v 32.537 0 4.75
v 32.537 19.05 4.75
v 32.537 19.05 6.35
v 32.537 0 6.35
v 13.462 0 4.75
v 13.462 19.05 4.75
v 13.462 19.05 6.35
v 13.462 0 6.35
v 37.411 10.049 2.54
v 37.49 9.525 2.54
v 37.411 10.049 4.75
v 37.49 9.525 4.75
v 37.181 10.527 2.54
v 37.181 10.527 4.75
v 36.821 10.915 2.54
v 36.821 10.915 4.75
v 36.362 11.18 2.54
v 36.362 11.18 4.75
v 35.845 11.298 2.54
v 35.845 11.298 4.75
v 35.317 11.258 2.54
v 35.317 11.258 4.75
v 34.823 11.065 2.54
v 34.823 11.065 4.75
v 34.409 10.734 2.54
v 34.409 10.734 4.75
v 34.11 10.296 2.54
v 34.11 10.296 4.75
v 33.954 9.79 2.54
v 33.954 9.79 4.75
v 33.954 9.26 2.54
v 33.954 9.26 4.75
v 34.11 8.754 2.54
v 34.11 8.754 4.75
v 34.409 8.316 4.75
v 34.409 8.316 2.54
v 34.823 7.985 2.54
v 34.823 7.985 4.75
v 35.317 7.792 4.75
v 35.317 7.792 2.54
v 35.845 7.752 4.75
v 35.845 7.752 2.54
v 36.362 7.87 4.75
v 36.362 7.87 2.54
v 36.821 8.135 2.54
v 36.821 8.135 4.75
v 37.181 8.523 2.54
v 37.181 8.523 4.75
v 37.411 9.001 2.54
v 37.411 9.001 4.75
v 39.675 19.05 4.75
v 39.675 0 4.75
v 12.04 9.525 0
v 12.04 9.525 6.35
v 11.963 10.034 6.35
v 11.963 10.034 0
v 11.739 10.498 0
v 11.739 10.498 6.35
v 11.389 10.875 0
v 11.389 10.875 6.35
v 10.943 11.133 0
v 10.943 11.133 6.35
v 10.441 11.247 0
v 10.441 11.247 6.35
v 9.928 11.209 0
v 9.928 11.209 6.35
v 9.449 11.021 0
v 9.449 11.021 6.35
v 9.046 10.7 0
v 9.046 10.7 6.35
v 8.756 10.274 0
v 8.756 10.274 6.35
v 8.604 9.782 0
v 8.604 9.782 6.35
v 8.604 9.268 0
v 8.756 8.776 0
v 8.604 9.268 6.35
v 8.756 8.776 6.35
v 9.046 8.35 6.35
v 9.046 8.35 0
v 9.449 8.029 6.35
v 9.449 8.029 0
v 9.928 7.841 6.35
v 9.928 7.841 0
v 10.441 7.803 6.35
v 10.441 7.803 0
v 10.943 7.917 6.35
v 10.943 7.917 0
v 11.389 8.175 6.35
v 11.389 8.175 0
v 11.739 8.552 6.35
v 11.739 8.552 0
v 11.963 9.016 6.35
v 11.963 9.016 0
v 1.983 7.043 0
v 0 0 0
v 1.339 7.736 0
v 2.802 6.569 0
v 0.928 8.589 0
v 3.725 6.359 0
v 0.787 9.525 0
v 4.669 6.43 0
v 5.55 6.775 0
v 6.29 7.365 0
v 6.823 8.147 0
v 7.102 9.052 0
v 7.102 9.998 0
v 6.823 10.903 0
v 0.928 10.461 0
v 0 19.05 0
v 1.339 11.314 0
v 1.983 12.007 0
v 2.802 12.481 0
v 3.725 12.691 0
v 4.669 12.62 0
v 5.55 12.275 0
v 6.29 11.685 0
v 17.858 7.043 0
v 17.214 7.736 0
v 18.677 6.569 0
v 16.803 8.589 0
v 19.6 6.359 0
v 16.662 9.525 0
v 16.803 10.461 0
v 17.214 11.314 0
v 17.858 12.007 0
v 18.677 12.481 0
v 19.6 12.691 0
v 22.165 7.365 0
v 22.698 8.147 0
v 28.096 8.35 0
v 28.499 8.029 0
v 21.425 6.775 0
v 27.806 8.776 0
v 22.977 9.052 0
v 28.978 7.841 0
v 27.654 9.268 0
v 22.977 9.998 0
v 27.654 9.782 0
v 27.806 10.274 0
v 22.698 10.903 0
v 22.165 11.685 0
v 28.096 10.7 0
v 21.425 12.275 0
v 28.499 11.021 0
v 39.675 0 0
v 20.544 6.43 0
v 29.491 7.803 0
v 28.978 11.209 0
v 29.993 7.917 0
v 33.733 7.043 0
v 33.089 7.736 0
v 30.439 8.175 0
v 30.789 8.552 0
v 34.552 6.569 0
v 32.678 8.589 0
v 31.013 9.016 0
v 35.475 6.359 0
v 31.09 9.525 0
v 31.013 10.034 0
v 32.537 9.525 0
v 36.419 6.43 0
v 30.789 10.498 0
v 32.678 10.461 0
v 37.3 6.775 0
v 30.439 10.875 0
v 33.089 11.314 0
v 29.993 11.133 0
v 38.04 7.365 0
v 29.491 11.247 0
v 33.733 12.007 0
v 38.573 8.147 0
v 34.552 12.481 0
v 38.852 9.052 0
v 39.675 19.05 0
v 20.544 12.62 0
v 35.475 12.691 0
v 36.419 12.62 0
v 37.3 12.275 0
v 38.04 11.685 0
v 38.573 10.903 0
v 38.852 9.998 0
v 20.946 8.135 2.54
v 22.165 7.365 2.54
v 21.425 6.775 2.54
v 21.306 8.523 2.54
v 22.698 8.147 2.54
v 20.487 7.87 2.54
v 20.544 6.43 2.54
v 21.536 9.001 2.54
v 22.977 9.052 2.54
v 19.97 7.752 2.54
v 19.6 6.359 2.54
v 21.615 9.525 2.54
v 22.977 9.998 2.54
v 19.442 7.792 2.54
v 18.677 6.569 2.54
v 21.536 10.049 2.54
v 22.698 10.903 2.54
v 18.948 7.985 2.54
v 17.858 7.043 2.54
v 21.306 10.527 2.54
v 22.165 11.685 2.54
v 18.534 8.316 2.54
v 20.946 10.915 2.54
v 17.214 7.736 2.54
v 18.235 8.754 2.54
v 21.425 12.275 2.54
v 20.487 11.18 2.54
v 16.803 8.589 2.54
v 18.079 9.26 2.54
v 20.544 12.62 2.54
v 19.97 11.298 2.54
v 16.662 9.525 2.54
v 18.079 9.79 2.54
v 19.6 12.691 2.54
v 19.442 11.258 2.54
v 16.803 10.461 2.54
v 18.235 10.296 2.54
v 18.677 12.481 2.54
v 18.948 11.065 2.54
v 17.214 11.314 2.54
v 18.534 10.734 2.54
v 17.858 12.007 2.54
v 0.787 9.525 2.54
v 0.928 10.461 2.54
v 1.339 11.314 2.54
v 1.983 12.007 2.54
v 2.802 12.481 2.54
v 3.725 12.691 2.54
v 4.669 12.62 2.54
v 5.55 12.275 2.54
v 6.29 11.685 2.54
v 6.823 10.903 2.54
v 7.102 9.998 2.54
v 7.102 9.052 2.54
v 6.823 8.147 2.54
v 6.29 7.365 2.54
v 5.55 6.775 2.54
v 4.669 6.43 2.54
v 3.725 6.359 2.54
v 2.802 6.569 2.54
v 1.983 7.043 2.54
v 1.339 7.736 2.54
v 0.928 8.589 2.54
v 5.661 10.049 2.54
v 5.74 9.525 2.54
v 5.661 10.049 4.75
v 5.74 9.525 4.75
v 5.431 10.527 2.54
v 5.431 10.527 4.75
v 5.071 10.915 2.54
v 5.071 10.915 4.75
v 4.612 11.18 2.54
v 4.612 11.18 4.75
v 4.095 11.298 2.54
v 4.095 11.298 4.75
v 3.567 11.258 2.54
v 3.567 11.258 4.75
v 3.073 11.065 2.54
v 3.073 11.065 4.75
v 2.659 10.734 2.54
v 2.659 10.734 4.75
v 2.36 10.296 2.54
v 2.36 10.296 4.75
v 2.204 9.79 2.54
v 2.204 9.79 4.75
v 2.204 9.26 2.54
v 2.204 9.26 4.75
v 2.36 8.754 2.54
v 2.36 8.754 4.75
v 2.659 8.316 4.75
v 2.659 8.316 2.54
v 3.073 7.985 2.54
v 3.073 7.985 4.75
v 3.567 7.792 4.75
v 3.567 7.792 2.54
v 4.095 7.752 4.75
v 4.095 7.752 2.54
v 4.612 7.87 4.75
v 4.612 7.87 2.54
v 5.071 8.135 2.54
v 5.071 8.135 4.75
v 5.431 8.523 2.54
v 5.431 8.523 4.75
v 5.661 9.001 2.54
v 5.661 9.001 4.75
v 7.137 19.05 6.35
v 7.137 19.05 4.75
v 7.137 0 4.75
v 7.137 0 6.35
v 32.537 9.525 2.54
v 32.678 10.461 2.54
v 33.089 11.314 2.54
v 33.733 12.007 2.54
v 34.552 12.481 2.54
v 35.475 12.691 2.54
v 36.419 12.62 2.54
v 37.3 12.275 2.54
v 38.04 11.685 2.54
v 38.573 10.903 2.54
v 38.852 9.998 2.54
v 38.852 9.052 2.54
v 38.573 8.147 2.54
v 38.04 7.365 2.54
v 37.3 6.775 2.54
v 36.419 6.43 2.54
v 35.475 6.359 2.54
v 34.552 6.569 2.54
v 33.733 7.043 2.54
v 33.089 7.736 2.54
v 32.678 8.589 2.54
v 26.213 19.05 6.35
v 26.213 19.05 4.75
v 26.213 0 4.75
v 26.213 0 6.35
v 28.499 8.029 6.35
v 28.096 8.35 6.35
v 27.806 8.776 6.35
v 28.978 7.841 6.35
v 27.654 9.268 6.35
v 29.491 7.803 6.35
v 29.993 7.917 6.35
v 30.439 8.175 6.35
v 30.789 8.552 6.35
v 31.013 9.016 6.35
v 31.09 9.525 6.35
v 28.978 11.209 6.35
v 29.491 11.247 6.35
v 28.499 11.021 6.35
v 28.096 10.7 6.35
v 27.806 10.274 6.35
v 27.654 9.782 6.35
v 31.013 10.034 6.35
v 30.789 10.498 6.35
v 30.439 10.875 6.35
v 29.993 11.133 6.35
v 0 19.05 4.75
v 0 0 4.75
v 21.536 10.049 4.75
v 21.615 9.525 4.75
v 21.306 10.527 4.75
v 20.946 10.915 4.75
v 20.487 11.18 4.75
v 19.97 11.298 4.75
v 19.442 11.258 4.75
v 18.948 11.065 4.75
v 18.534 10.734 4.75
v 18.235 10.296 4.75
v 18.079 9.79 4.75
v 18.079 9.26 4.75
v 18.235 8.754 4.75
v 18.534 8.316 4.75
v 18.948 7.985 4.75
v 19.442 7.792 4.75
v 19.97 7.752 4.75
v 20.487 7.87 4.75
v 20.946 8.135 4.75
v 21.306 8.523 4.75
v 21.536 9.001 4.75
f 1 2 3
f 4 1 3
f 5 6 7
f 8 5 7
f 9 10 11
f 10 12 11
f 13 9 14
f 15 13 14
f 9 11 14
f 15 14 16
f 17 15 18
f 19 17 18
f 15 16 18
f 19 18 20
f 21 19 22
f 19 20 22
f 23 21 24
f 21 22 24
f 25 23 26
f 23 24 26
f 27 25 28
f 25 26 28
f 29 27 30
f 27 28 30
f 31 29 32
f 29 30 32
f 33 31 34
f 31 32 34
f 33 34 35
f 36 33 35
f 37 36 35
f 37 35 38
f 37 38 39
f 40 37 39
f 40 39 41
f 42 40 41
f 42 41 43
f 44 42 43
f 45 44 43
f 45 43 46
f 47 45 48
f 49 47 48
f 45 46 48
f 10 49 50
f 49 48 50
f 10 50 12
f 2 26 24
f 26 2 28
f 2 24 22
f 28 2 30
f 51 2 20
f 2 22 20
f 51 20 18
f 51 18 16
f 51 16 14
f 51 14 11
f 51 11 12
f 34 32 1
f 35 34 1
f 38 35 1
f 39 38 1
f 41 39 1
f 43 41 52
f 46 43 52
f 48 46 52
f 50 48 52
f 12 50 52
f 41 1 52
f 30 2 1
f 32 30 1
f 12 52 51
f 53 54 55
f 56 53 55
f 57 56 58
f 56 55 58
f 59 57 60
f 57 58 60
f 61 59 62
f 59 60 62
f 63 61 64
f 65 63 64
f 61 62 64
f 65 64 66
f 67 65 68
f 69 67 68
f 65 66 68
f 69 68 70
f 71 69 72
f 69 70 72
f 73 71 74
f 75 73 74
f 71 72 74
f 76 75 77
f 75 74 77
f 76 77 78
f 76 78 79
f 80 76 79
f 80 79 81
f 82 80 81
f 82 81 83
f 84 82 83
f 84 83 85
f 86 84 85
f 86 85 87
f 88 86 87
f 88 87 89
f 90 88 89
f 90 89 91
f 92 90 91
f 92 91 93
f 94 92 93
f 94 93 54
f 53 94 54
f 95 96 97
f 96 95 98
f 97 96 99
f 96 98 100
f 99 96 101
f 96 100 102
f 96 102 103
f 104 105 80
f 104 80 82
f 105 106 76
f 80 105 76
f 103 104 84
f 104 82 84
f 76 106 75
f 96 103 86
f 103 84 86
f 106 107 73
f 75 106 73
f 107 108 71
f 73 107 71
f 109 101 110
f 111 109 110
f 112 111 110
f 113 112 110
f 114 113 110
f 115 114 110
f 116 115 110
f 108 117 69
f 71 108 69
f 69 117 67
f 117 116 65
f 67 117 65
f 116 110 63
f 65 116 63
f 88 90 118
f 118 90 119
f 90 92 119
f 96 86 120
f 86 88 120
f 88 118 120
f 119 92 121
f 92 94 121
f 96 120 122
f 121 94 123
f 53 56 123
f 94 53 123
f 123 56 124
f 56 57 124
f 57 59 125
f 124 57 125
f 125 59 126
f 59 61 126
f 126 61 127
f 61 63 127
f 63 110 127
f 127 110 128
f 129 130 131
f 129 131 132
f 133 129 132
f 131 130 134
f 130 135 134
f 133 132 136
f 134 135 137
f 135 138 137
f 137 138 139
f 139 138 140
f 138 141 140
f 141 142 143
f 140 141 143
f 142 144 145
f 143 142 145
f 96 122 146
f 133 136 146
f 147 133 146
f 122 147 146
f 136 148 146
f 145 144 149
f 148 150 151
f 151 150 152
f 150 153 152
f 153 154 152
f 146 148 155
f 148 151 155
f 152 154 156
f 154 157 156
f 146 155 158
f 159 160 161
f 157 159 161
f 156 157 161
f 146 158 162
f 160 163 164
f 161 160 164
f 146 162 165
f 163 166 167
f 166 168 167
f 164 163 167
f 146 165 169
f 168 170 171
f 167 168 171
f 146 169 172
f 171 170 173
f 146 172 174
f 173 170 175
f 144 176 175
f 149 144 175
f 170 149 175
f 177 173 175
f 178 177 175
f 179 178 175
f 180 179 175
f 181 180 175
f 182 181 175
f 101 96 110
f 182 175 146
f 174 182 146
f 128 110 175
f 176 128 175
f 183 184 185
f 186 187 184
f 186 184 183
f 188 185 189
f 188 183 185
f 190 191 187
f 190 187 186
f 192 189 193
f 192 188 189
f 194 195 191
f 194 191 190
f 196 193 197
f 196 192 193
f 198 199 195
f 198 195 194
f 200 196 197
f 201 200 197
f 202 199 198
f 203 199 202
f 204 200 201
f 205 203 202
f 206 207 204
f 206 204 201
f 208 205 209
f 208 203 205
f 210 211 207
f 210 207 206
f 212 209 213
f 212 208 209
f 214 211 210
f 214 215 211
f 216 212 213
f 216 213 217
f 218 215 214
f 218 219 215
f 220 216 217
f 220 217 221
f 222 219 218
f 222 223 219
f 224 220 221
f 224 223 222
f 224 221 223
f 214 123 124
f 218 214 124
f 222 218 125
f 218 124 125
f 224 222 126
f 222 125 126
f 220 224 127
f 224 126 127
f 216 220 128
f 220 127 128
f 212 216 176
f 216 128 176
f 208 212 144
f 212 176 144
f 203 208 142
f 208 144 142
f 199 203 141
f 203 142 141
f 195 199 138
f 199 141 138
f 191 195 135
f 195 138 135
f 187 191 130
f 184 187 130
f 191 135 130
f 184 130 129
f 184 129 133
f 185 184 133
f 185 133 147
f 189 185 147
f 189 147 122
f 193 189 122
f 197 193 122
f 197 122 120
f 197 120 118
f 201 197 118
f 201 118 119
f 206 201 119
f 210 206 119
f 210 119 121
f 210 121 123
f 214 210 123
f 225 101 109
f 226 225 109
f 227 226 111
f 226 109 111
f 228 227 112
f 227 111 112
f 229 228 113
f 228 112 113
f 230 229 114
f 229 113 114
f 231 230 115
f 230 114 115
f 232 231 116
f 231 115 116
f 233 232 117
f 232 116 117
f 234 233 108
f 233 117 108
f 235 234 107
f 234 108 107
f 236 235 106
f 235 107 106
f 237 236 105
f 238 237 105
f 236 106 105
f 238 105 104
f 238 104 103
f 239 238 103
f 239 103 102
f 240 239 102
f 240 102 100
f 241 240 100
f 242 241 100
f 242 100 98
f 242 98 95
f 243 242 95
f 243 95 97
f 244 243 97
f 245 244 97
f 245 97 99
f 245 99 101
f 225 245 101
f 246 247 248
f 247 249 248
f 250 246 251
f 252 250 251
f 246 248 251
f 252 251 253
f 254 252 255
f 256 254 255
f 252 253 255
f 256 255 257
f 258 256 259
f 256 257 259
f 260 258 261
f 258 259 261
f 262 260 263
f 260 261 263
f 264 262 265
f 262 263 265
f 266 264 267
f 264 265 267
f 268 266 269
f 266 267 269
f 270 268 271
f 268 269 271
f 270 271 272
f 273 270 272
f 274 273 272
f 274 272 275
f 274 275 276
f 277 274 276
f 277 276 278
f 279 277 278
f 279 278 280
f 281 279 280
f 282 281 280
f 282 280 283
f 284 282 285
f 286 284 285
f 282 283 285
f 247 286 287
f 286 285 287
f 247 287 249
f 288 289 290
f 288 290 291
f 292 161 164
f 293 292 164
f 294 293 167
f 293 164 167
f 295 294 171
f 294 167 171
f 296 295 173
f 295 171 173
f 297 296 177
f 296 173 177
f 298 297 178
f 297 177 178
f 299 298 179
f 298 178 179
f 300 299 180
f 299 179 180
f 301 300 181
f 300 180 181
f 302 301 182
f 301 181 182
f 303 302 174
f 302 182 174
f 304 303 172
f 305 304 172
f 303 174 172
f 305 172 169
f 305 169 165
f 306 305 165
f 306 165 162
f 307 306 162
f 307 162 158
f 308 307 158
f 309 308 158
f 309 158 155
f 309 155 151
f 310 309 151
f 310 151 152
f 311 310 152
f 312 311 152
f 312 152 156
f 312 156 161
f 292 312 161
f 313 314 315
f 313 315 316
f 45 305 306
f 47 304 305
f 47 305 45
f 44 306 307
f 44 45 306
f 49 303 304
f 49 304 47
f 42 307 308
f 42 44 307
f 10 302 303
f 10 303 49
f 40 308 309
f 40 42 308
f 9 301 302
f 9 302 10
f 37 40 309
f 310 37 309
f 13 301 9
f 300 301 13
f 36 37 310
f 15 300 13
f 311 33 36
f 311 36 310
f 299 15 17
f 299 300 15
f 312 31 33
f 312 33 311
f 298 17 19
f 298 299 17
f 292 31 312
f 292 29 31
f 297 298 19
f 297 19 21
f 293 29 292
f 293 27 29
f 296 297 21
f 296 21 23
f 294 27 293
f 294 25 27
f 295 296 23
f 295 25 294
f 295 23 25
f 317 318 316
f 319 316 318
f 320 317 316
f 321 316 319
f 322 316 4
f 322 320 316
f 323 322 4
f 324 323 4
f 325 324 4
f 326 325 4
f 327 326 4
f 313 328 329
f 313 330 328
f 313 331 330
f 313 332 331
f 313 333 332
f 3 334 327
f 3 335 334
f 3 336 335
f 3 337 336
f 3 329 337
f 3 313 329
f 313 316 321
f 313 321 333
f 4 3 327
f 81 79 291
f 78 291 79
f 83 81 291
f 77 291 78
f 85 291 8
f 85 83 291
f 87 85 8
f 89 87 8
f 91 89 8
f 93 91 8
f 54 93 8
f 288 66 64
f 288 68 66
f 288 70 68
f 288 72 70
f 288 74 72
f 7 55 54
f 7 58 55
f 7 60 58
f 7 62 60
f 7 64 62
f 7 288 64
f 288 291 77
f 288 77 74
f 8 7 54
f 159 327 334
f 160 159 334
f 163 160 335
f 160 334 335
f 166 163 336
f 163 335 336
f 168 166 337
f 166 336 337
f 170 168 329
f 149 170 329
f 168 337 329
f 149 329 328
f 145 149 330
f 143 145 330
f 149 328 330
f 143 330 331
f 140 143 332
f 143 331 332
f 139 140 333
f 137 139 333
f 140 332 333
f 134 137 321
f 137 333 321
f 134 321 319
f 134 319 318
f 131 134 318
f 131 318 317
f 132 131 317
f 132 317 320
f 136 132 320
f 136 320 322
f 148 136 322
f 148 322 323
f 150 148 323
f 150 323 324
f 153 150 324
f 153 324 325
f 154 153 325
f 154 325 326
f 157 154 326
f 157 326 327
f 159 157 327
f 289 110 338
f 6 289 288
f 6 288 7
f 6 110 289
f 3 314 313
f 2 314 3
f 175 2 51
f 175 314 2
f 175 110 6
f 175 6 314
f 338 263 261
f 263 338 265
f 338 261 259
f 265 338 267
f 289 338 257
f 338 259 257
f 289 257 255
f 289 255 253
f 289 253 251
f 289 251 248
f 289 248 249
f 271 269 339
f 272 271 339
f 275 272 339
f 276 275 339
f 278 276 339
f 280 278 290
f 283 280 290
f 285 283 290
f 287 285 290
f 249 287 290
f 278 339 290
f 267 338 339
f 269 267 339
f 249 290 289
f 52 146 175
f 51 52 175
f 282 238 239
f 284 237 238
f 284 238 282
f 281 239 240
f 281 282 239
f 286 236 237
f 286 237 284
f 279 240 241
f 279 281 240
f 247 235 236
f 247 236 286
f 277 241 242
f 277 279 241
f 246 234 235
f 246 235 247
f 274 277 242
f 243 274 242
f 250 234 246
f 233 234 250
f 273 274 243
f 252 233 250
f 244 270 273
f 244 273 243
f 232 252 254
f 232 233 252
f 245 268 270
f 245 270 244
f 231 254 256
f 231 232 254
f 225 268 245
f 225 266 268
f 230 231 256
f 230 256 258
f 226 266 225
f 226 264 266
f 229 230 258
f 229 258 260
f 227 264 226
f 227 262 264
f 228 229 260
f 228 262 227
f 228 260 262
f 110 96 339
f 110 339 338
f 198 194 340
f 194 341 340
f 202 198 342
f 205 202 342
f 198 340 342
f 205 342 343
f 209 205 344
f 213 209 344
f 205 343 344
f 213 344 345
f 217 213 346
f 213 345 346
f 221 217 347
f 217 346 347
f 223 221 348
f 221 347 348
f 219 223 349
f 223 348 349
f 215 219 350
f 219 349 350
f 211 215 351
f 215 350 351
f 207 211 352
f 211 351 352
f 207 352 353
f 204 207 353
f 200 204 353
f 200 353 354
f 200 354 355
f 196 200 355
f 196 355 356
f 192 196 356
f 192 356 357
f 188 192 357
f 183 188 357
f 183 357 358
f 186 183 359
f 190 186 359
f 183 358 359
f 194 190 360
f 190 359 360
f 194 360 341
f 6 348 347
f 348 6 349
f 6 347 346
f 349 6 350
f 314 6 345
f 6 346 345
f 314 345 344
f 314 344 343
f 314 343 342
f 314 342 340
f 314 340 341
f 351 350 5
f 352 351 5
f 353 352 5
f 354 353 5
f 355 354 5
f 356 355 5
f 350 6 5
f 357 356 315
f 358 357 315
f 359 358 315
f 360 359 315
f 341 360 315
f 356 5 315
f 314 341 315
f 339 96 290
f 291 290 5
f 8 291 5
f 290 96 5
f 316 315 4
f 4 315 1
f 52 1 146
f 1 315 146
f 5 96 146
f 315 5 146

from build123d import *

# Parameters (mm, degrees)
SKETCH1_W             = 39.6748
SKETCH1_H             = 19.05
EXTRUDE1_DEPTH        = 6.35
SKETCH2_W             = 7.1374
SKETCH2_H             = 1.6002
SKETCH2_W_2           = 12.7508
CUT_EXTRUDE1_DEPTH    = 20.05
HOLE1_D               = 3.556
HOLE1_CBORE_D         = 6.35
HOLE1_CBORE_DEPTH     = 2.54
F_8_32_TAPPED_HOLE1_D = 3.4544


with BuildPart() as part:
    # Sketch1 → Extrude1 (new body)
    with BuildSketch(Plane.XY):
        with Locations((19.8374, 9.525)):
            Rectangle(SKETCH1_W, SKETCH1_H)
    extrude(amount=EXTRUDE1_DEPTH)

    # Sketch2 → Cut-Extrude1 (cut, through all)
    with BuildSketch(Plane.XZ):
        with Locations((3.5687, 5.5499)):
            Rectangle(SKETCH2_W, SKETCH2_H)
        with Locations((19.8374, 5.5499)):
            Rectangle(SKETCH2_W_2, SKETCH2_H)
        with Locations((36.1061, 5.5499)):
            Rectangle(SKETCH2_W, SKETCH2_H)
    extrude(amount=-CUT_EXTRUDE1_DEPTH, mode=Mode.SUBTRACT)

    # Hole1 (through all)
    with Locations(Plane(origin=(0, 0, 0), x_dir=(-1, 0, 0), z_dir=(0, 0, -1))):
        with Locations((-3.9624, 9.525), (-19.8374, 9.525), (-35.7124, 9.525)):
            CounterBoreHole(HOLE1_D / 2, HOLE1_CBORE_D / 2, HOLE1_CBORE_DEPTH)

    # #8-32 Tapped Hole1 (through all)
    with Locations(Plane(origin=(0, 0, 0), x_dir=(-1, 0, 0), z_dir=(0, 0, -1))):
        with Locations((-10.3124, 9.525), (-29.3624, 9.525)):
            Hole(F_8_32_TAPPED_HOLE1_D / 2)


solid = part.part
